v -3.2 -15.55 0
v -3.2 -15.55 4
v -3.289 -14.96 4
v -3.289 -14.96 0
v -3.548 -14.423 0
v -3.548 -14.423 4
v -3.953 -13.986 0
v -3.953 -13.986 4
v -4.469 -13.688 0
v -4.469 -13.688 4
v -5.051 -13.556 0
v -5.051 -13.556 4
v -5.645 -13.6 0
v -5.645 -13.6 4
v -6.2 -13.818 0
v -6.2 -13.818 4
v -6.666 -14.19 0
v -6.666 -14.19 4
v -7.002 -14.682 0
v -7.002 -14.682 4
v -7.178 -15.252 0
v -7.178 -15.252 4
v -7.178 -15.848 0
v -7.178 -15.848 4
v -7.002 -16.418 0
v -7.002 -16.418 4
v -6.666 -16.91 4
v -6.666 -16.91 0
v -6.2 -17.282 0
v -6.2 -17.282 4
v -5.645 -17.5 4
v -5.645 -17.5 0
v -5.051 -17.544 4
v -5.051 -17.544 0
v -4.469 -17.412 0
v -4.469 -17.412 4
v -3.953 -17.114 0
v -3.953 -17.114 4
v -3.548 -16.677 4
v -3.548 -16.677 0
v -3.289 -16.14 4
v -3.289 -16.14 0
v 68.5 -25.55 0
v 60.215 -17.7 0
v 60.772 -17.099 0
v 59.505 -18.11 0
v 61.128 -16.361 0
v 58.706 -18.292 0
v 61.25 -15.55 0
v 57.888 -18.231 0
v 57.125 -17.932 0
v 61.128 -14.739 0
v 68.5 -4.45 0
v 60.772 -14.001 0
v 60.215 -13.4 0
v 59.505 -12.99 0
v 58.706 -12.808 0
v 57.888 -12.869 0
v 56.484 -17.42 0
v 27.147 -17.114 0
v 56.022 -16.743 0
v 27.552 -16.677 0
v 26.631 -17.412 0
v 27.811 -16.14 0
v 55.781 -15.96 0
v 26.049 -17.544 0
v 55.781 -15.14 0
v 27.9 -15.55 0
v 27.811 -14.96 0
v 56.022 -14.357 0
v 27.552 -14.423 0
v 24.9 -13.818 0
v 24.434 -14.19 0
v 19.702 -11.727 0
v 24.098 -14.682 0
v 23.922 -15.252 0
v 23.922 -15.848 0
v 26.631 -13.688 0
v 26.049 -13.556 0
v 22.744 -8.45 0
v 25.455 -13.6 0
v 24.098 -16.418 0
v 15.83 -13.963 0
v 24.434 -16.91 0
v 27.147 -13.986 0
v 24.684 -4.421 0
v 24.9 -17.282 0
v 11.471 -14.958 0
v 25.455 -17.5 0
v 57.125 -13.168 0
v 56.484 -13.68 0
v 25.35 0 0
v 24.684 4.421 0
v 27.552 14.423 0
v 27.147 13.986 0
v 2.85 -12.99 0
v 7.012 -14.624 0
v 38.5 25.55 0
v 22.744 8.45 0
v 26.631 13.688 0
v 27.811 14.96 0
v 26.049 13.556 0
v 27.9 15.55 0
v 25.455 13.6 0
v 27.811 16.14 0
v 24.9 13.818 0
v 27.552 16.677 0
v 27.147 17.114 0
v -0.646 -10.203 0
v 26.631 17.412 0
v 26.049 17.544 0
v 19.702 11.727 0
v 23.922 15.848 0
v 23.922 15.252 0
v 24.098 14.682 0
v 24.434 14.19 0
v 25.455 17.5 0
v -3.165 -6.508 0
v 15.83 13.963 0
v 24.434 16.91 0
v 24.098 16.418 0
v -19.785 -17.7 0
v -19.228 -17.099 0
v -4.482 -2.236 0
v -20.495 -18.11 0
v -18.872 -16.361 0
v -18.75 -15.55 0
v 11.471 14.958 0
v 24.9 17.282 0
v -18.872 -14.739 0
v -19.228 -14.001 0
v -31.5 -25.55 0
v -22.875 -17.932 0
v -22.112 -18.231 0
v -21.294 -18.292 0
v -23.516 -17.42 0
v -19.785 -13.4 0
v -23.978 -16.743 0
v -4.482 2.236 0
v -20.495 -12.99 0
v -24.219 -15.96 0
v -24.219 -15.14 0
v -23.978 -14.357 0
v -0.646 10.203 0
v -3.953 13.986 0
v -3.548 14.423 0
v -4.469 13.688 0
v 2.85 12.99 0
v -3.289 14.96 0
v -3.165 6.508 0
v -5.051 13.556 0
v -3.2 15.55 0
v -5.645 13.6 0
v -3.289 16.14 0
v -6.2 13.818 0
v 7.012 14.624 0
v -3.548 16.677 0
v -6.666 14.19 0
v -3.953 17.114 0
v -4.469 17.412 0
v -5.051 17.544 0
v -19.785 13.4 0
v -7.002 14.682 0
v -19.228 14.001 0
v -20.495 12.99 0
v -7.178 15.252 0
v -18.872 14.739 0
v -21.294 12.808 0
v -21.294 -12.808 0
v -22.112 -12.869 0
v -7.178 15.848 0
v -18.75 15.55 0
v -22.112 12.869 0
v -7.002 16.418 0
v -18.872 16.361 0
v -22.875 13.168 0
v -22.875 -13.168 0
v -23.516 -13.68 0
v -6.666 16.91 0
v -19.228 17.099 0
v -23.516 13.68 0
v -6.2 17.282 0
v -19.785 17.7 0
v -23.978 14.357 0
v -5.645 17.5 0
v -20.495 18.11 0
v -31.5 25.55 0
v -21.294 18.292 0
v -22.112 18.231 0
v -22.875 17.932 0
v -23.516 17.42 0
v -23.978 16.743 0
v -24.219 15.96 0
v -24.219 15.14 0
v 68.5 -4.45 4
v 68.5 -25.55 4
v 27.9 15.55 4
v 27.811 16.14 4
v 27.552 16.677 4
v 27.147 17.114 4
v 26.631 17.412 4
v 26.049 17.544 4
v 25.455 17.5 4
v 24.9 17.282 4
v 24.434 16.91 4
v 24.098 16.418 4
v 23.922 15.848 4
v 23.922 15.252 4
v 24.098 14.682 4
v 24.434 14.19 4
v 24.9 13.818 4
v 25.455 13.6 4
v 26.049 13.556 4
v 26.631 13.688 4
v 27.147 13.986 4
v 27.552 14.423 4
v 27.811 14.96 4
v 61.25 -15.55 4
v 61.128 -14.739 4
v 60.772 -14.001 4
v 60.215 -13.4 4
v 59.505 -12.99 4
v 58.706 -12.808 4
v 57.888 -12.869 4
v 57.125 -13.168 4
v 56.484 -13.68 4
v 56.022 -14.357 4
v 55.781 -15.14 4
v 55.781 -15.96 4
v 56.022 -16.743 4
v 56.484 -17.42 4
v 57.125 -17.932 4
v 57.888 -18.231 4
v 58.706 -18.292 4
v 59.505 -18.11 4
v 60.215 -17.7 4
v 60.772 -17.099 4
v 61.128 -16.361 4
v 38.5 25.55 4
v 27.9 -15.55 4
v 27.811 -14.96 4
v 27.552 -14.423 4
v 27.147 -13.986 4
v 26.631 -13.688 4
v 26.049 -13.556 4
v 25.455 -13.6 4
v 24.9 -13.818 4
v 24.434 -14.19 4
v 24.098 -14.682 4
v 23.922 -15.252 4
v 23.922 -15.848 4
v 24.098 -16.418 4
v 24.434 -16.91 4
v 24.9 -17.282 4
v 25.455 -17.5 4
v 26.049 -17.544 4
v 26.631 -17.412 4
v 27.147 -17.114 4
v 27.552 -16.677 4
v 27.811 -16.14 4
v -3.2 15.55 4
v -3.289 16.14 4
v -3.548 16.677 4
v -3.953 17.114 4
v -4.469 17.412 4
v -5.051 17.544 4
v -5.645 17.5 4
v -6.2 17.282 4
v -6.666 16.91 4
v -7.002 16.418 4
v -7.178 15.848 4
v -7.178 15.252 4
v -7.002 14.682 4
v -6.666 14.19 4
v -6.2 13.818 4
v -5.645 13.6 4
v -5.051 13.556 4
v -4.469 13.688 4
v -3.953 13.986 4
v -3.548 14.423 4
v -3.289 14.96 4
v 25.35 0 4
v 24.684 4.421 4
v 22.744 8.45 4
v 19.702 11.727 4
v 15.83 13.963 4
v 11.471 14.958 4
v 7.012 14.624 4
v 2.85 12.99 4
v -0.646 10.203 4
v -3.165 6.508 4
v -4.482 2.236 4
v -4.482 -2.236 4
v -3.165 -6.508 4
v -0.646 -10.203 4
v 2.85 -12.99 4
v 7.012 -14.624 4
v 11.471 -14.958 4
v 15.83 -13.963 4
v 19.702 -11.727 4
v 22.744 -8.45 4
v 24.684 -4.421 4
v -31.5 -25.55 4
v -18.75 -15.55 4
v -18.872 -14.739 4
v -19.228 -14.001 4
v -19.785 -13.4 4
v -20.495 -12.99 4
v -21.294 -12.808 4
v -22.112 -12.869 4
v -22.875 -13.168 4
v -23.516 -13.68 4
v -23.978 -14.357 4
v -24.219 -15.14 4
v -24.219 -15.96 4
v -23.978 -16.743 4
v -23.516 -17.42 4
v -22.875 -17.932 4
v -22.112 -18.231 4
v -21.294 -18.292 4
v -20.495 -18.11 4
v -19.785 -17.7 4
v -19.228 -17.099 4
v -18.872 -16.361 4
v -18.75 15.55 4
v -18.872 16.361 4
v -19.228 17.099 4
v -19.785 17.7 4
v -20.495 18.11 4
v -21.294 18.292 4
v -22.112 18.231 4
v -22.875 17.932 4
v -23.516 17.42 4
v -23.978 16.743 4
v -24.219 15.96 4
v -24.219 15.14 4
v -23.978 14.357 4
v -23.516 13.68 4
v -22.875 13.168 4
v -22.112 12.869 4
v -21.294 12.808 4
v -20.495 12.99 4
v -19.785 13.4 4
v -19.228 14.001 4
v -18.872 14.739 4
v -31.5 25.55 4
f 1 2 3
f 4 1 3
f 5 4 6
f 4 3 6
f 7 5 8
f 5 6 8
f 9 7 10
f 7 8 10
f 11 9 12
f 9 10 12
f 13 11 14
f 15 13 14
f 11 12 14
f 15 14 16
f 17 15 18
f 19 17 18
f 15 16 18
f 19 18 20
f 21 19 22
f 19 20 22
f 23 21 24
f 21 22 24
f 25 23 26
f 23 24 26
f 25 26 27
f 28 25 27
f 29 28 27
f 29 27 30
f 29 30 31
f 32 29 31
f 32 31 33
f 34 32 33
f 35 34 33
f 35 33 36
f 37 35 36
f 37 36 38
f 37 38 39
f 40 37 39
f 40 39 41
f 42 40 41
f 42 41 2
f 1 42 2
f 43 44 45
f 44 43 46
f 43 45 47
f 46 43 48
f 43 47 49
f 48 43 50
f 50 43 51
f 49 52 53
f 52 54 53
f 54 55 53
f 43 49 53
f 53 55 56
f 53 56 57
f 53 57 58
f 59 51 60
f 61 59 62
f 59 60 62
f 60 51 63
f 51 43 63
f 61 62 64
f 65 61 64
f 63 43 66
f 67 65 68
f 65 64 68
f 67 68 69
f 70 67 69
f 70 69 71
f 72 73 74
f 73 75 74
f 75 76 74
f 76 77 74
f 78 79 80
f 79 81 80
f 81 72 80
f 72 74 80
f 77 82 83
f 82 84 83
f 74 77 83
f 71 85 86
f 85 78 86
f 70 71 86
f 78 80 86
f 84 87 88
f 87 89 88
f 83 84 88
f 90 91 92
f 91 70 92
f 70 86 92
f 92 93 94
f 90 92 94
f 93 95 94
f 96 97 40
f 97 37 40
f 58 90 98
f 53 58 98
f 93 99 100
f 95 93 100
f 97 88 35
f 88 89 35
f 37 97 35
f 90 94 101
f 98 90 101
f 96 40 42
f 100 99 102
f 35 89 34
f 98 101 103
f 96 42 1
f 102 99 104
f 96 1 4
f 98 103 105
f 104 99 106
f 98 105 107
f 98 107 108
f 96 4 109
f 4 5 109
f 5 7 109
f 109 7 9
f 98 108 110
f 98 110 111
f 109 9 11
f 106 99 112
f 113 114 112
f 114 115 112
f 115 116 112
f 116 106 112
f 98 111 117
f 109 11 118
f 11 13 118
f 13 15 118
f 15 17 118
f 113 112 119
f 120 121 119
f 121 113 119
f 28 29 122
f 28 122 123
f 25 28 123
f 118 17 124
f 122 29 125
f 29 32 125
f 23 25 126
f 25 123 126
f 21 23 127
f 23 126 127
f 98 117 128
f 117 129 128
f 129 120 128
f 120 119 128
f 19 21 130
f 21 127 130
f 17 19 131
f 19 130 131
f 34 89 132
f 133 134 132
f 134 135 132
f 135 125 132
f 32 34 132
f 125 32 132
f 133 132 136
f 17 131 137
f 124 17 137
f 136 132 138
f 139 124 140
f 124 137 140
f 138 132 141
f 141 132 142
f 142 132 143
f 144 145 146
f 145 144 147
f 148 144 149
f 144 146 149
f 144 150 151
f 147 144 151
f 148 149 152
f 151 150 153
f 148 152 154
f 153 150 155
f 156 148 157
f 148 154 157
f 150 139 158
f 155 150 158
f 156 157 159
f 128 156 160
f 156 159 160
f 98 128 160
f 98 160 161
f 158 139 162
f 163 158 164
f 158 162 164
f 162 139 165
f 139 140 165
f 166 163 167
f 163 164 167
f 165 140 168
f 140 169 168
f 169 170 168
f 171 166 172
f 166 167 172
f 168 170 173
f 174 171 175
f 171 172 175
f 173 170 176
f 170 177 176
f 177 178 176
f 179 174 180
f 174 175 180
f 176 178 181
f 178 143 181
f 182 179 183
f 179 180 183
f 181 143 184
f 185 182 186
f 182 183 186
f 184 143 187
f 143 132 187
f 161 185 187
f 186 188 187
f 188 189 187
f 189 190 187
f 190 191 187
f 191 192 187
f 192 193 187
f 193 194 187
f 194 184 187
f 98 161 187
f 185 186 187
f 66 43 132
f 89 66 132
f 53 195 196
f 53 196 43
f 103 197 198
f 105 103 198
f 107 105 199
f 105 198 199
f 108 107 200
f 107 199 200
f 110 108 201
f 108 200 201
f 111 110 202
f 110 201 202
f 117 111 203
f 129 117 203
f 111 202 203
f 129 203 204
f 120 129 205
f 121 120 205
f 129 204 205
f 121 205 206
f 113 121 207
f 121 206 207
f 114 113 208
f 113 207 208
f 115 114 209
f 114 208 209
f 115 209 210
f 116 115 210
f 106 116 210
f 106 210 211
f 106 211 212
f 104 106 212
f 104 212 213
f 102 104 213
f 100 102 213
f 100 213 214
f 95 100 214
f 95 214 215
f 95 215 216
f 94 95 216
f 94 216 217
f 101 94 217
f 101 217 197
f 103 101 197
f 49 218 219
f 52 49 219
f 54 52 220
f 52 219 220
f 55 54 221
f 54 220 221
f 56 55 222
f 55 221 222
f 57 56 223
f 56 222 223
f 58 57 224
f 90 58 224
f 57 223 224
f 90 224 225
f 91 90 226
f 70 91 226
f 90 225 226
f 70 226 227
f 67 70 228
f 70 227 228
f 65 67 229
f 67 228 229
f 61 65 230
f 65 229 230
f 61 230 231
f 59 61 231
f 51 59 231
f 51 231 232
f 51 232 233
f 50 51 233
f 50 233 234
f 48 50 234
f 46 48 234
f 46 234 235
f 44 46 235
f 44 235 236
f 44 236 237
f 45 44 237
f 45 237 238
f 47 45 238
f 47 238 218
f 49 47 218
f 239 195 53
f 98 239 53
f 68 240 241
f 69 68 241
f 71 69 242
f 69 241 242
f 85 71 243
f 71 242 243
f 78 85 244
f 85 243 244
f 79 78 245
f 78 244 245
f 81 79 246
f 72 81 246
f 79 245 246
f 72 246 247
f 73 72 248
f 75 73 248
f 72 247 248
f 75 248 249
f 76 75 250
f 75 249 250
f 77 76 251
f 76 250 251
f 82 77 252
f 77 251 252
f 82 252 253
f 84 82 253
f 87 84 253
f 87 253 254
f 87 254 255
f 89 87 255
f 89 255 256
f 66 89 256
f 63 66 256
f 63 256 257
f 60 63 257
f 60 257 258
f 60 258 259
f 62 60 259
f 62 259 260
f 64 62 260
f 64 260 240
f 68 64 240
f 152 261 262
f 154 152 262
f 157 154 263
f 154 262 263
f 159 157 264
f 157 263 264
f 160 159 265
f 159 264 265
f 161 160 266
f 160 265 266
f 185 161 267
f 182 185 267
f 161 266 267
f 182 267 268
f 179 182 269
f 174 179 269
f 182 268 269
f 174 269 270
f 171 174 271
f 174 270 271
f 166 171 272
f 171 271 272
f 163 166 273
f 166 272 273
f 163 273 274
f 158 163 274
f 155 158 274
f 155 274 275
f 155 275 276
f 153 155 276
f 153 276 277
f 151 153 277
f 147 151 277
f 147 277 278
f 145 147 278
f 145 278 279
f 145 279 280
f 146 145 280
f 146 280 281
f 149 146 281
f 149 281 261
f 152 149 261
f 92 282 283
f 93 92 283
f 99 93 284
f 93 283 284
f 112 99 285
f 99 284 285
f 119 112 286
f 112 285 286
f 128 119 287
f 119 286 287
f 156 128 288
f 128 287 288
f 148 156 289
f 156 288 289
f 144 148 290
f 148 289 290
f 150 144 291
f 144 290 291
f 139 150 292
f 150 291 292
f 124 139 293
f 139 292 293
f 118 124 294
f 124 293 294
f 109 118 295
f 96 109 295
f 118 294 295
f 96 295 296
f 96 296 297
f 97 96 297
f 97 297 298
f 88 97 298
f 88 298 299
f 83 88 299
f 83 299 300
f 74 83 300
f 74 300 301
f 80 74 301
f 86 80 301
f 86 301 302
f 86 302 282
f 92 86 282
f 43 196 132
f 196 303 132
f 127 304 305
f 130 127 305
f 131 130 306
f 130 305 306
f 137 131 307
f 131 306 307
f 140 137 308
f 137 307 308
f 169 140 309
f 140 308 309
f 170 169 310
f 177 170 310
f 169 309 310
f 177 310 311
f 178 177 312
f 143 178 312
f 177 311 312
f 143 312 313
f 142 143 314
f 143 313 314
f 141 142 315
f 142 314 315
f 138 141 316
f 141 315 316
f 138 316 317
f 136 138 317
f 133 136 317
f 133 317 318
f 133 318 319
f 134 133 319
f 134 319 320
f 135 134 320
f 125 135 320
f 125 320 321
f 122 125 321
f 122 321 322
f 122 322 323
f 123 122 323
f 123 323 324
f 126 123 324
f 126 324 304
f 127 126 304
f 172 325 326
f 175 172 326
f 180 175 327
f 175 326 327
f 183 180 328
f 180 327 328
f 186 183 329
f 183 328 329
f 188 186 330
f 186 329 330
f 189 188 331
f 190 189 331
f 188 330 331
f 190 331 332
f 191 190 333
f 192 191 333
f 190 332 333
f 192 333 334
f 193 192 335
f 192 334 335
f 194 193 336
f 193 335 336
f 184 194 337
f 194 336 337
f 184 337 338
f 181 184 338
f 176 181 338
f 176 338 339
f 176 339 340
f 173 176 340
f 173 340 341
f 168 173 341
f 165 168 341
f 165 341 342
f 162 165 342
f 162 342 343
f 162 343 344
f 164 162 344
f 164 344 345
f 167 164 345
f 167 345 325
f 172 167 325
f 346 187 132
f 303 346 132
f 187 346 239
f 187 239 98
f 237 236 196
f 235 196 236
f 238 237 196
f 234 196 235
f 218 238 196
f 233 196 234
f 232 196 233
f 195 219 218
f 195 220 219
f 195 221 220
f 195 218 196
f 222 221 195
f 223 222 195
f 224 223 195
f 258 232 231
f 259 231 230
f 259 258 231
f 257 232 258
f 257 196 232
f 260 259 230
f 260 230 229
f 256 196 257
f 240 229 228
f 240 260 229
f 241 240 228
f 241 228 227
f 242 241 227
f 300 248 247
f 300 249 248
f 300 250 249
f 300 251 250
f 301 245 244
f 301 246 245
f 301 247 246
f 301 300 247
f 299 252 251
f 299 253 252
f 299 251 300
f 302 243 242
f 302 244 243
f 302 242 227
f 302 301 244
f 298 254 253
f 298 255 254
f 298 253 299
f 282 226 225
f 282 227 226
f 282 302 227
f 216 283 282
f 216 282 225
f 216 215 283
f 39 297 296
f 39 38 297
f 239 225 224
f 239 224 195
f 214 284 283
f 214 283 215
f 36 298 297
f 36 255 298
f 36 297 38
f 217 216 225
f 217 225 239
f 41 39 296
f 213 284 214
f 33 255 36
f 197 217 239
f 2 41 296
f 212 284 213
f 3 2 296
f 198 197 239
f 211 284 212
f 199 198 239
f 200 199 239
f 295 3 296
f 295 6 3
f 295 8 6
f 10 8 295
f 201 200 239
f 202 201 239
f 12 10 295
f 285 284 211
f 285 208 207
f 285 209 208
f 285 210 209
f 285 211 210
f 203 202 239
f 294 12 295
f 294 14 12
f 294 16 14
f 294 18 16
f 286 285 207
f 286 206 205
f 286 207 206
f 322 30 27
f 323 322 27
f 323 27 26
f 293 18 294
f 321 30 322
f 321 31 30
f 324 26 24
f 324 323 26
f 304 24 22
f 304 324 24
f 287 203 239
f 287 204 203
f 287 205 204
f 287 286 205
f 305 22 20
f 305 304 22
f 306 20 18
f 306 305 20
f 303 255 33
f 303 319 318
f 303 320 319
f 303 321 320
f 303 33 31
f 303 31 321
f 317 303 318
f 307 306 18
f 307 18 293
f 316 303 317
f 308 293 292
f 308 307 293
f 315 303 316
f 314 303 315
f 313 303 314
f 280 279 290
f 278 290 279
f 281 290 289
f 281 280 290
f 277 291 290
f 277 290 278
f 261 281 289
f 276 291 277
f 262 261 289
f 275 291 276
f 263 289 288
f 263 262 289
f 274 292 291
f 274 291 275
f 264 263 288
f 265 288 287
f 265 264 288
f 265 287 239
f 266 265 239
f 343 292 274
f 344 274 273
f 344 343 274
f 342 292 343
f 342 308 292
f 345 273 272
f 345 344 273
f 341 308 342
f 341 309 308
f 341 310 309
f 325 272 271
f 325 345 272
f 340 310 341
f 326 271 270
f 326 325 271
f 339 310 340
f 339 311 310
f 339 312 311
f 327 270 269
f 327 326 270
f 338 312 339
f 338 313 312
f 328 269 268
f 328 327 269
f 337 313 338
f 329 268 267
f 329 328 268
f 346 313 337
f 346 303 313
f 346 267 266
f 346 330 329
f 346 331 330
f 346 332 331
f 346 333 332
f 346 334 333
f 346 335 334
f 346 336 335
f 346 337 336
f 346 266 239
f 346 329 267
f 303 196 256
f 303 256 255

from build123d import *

# Parameters (mm, degrees)
BOSS_EXTRUDE1_DEPTH = 4
CUT_EXTRUDE1_REACH  = 42.756
SKETCH2_R           = 2
SKETCH2_R_2         = 2.75
SKETCH2_R_3         = 15
SKETCH4_W           = 4
SKETCH4_H           = 51.1
BOSS_EXTRUDE2_DEPTH = 37
CUT_EXTRUDE2_REACH  = 75.219
SKETCH5_R           = 2.75
CHAMFER2_SIZE       = 30


with BuildPart() as part:
    # Sketch1 → Boss-Extrude1 (new body)
    with BuildSketch(Plane.XY):
        Polygon((-31.5, 21.15), (-31.5, -21.15), (-31.5, -25.55), (31.5, -25.55), (31.5, -21.15), (31.5, 21.15), (31.5, 25.55), (-31.5, 25.55), align=None)
    extrude(amount=BOSS_EXTRUDE1_DEPTH)

    # Sketch2 → Cut-Extrude1 (cut, up to next)
    with BuildSketch(Plane.XY.offset(4), mode=Mode.PRIVATE) as cut_extrude1_sk1:
        with Locations((-5.2, 15.55)):
            Circle(SKETCH2_R)
    cut_extrude1_tool1 = extrude(cut_extrude1_sk1.sketch, amount=-CUT_EXTRUDE1_REACH, mode=Mode.PRIVATE) & part.part
    # Sketch2 → Cut-Extrude1 (cut, up to next)
    with BuildSketch(Plane.XY.offset(4), mode=Mode.PRIVATE) as cut_extrude1_sk2:
        with Locations((25.9, 15.55)):
            Circle(SKETCH2_R)
    cut_extrude1_tool2 = extrude(cut_extrude1_sk2.sketch, amount=-CUT_EXTRUDE1_REACH, mode=Mode.PRIVATE) & part.part
    # Sketch2 → Cut-Extrude1 (cut, up to next)
    with BuildSketch(Plane.XY.offset(4), mode=Mode.PRIVATE) as cut_extrude1_sk3:
        with Locations((25.9, -15.55)):
            Circle(SKETCH2_R)
    cut_extrude1_tool3 = extrude(cut_extrude1_sk3.sketch, amount=-CUT_EXTRUDE1_REACH, mode=Mode.PRIVATE) & part.part
    # Sketch2 → Cut-Extrude1 (cut, up to next)
    with BuildSketch(Plane.XY.offset(4), mode=Mode.PRIVATE) as cut_extrude1_sk4:
        with Locations((-5.2, -15.55)):
            Circle(SKETCH2_R)
    cut_extrude1_tool4 = extrude(cut_extrude1_sk4.sketch, amount=-CUT_EXTRUDE1_REACH, mode=Mode.PRIVATE) & part.part
    # Sketch2 → Cut-Extrude1 (cut, up to next)
    with BuildSketch(Plane.XY.offset(4), mode=Mode.PRIVATE) as cut_extrude1_sk5:
        with Locations((-21.5, 15.55)):
            Circle(SKETCH2_R_2)
    cut_extrude1_tool5 = extrude(cut_extrude1_sk5.sketch, amount=-CUT_EXTRUDE1_REACH, mode=Mode.PRIVATE) & part.part
    # Sketch2 → Cut-Extrude1 (cut, up to next)
    with BuildSketch(Plane.XY.offset(4), mode=Mode.PRIVATE) as cut_extrude1_sk6:
        with Locations((-21.5, -15.55)):
            Circle(SKETCH2_R_2)
    cut_extrude1_tool6 = extrude(cut_extrude1_sk6.sketch, amount=-CUT_EXTRUDE1_REACH, mode=Mode.PRIVATE) & part.part
    # Sketch2 → Cut-Extrude1 (cut, up to next)
    with BuildSketch(Plane.XY.offset(4), mode=Mode.PRIVATE) as cut_extrude1_sk7:
        with Locations((10.35, 0)):
            Circle(SKETCH2_R_3)
    cut_extrude1_tool7 = extrude(cut_extrude1_sk7.sketch, amount=-CUT_EXTRUDE1_REACH, mode=Mode.PRIVATE) & part.part
    add(cut_extrude1_tool1.solids().sort_by_distance((-5.2, 15.55, 4))[0], mode=Mode.SUBTRACT)
    add(cut_extrude1_tool2.solids().sort_by_distance((25.9, 15.55, 4))[0], mode=Mode.SUBTRACT)
    add(cut_extrude1_tool3.solids().sort_by_distance((25.9, -15.55, 4))[0], mode=Mode.SUBTRACT)
    add(cut_extrude1_tool4.solids().sort_by_distance((-5.2, -15.55, 4))[0], mode=Mode.SUBTRACT)
    add(cut_extrude1_tool5.solids().sort_by_distance((-21.5, 15.55, 4))[0], mode=Mode.SUBTRACT)
    add(cut_extrude1_tool6.solids().sort_by_distance((-21.5, -15.55, 4))[0], mode=Mode.SUBTRACT)
    add(cut_extrude1_tool7.solids().sort_by_distance((10.35, 0, 4))[0], mode=Mode.SUBTRACT)

    # Sketch4 → Boss-Extrude2 (add)
    with BuildSketch(Plane(origin=(31.5, 0, 0), x_dir=(0, 0, -1), z_dir=(1, 0, 0))):
        with Locations((-2, 0)):
            Rectangle(SKETCH4_W, SKETCH4_H)
    extrude(amount=BOSS_EXTRUDE2_DEPTH)

    # Sketch5 → Cut-Extrude2 (cut, up to next)
    with BuildSketch(Plane.XY.offset(4), mode=Mode.PRIVATE) as cut_extrude2_sk1:
        with Locations((58.5, -15.55)):
            Circle(SKETCH5_R)
    cut_extrude2_tool1 = extrude(cut_extrude2_sk1.sketch, amount=-CUT_EXTRUDE2_REACH, mode=Mode.PRIVATE) & part.part
    add(cut_extrude2_tool1.solids().sort_by_distance((58.5, -15.55, 4))[0], mode=Mode.SUBTRACT)

    # Chamfer2
    chamfer2_edges = [part.edges().sort_by_distance(p)[0] for p in [
        (68.5, 25.55, 2),
    ]]
    chamfer(chamfer2_edges, length=CHAMFER2_SIZE)


solid = part.part
